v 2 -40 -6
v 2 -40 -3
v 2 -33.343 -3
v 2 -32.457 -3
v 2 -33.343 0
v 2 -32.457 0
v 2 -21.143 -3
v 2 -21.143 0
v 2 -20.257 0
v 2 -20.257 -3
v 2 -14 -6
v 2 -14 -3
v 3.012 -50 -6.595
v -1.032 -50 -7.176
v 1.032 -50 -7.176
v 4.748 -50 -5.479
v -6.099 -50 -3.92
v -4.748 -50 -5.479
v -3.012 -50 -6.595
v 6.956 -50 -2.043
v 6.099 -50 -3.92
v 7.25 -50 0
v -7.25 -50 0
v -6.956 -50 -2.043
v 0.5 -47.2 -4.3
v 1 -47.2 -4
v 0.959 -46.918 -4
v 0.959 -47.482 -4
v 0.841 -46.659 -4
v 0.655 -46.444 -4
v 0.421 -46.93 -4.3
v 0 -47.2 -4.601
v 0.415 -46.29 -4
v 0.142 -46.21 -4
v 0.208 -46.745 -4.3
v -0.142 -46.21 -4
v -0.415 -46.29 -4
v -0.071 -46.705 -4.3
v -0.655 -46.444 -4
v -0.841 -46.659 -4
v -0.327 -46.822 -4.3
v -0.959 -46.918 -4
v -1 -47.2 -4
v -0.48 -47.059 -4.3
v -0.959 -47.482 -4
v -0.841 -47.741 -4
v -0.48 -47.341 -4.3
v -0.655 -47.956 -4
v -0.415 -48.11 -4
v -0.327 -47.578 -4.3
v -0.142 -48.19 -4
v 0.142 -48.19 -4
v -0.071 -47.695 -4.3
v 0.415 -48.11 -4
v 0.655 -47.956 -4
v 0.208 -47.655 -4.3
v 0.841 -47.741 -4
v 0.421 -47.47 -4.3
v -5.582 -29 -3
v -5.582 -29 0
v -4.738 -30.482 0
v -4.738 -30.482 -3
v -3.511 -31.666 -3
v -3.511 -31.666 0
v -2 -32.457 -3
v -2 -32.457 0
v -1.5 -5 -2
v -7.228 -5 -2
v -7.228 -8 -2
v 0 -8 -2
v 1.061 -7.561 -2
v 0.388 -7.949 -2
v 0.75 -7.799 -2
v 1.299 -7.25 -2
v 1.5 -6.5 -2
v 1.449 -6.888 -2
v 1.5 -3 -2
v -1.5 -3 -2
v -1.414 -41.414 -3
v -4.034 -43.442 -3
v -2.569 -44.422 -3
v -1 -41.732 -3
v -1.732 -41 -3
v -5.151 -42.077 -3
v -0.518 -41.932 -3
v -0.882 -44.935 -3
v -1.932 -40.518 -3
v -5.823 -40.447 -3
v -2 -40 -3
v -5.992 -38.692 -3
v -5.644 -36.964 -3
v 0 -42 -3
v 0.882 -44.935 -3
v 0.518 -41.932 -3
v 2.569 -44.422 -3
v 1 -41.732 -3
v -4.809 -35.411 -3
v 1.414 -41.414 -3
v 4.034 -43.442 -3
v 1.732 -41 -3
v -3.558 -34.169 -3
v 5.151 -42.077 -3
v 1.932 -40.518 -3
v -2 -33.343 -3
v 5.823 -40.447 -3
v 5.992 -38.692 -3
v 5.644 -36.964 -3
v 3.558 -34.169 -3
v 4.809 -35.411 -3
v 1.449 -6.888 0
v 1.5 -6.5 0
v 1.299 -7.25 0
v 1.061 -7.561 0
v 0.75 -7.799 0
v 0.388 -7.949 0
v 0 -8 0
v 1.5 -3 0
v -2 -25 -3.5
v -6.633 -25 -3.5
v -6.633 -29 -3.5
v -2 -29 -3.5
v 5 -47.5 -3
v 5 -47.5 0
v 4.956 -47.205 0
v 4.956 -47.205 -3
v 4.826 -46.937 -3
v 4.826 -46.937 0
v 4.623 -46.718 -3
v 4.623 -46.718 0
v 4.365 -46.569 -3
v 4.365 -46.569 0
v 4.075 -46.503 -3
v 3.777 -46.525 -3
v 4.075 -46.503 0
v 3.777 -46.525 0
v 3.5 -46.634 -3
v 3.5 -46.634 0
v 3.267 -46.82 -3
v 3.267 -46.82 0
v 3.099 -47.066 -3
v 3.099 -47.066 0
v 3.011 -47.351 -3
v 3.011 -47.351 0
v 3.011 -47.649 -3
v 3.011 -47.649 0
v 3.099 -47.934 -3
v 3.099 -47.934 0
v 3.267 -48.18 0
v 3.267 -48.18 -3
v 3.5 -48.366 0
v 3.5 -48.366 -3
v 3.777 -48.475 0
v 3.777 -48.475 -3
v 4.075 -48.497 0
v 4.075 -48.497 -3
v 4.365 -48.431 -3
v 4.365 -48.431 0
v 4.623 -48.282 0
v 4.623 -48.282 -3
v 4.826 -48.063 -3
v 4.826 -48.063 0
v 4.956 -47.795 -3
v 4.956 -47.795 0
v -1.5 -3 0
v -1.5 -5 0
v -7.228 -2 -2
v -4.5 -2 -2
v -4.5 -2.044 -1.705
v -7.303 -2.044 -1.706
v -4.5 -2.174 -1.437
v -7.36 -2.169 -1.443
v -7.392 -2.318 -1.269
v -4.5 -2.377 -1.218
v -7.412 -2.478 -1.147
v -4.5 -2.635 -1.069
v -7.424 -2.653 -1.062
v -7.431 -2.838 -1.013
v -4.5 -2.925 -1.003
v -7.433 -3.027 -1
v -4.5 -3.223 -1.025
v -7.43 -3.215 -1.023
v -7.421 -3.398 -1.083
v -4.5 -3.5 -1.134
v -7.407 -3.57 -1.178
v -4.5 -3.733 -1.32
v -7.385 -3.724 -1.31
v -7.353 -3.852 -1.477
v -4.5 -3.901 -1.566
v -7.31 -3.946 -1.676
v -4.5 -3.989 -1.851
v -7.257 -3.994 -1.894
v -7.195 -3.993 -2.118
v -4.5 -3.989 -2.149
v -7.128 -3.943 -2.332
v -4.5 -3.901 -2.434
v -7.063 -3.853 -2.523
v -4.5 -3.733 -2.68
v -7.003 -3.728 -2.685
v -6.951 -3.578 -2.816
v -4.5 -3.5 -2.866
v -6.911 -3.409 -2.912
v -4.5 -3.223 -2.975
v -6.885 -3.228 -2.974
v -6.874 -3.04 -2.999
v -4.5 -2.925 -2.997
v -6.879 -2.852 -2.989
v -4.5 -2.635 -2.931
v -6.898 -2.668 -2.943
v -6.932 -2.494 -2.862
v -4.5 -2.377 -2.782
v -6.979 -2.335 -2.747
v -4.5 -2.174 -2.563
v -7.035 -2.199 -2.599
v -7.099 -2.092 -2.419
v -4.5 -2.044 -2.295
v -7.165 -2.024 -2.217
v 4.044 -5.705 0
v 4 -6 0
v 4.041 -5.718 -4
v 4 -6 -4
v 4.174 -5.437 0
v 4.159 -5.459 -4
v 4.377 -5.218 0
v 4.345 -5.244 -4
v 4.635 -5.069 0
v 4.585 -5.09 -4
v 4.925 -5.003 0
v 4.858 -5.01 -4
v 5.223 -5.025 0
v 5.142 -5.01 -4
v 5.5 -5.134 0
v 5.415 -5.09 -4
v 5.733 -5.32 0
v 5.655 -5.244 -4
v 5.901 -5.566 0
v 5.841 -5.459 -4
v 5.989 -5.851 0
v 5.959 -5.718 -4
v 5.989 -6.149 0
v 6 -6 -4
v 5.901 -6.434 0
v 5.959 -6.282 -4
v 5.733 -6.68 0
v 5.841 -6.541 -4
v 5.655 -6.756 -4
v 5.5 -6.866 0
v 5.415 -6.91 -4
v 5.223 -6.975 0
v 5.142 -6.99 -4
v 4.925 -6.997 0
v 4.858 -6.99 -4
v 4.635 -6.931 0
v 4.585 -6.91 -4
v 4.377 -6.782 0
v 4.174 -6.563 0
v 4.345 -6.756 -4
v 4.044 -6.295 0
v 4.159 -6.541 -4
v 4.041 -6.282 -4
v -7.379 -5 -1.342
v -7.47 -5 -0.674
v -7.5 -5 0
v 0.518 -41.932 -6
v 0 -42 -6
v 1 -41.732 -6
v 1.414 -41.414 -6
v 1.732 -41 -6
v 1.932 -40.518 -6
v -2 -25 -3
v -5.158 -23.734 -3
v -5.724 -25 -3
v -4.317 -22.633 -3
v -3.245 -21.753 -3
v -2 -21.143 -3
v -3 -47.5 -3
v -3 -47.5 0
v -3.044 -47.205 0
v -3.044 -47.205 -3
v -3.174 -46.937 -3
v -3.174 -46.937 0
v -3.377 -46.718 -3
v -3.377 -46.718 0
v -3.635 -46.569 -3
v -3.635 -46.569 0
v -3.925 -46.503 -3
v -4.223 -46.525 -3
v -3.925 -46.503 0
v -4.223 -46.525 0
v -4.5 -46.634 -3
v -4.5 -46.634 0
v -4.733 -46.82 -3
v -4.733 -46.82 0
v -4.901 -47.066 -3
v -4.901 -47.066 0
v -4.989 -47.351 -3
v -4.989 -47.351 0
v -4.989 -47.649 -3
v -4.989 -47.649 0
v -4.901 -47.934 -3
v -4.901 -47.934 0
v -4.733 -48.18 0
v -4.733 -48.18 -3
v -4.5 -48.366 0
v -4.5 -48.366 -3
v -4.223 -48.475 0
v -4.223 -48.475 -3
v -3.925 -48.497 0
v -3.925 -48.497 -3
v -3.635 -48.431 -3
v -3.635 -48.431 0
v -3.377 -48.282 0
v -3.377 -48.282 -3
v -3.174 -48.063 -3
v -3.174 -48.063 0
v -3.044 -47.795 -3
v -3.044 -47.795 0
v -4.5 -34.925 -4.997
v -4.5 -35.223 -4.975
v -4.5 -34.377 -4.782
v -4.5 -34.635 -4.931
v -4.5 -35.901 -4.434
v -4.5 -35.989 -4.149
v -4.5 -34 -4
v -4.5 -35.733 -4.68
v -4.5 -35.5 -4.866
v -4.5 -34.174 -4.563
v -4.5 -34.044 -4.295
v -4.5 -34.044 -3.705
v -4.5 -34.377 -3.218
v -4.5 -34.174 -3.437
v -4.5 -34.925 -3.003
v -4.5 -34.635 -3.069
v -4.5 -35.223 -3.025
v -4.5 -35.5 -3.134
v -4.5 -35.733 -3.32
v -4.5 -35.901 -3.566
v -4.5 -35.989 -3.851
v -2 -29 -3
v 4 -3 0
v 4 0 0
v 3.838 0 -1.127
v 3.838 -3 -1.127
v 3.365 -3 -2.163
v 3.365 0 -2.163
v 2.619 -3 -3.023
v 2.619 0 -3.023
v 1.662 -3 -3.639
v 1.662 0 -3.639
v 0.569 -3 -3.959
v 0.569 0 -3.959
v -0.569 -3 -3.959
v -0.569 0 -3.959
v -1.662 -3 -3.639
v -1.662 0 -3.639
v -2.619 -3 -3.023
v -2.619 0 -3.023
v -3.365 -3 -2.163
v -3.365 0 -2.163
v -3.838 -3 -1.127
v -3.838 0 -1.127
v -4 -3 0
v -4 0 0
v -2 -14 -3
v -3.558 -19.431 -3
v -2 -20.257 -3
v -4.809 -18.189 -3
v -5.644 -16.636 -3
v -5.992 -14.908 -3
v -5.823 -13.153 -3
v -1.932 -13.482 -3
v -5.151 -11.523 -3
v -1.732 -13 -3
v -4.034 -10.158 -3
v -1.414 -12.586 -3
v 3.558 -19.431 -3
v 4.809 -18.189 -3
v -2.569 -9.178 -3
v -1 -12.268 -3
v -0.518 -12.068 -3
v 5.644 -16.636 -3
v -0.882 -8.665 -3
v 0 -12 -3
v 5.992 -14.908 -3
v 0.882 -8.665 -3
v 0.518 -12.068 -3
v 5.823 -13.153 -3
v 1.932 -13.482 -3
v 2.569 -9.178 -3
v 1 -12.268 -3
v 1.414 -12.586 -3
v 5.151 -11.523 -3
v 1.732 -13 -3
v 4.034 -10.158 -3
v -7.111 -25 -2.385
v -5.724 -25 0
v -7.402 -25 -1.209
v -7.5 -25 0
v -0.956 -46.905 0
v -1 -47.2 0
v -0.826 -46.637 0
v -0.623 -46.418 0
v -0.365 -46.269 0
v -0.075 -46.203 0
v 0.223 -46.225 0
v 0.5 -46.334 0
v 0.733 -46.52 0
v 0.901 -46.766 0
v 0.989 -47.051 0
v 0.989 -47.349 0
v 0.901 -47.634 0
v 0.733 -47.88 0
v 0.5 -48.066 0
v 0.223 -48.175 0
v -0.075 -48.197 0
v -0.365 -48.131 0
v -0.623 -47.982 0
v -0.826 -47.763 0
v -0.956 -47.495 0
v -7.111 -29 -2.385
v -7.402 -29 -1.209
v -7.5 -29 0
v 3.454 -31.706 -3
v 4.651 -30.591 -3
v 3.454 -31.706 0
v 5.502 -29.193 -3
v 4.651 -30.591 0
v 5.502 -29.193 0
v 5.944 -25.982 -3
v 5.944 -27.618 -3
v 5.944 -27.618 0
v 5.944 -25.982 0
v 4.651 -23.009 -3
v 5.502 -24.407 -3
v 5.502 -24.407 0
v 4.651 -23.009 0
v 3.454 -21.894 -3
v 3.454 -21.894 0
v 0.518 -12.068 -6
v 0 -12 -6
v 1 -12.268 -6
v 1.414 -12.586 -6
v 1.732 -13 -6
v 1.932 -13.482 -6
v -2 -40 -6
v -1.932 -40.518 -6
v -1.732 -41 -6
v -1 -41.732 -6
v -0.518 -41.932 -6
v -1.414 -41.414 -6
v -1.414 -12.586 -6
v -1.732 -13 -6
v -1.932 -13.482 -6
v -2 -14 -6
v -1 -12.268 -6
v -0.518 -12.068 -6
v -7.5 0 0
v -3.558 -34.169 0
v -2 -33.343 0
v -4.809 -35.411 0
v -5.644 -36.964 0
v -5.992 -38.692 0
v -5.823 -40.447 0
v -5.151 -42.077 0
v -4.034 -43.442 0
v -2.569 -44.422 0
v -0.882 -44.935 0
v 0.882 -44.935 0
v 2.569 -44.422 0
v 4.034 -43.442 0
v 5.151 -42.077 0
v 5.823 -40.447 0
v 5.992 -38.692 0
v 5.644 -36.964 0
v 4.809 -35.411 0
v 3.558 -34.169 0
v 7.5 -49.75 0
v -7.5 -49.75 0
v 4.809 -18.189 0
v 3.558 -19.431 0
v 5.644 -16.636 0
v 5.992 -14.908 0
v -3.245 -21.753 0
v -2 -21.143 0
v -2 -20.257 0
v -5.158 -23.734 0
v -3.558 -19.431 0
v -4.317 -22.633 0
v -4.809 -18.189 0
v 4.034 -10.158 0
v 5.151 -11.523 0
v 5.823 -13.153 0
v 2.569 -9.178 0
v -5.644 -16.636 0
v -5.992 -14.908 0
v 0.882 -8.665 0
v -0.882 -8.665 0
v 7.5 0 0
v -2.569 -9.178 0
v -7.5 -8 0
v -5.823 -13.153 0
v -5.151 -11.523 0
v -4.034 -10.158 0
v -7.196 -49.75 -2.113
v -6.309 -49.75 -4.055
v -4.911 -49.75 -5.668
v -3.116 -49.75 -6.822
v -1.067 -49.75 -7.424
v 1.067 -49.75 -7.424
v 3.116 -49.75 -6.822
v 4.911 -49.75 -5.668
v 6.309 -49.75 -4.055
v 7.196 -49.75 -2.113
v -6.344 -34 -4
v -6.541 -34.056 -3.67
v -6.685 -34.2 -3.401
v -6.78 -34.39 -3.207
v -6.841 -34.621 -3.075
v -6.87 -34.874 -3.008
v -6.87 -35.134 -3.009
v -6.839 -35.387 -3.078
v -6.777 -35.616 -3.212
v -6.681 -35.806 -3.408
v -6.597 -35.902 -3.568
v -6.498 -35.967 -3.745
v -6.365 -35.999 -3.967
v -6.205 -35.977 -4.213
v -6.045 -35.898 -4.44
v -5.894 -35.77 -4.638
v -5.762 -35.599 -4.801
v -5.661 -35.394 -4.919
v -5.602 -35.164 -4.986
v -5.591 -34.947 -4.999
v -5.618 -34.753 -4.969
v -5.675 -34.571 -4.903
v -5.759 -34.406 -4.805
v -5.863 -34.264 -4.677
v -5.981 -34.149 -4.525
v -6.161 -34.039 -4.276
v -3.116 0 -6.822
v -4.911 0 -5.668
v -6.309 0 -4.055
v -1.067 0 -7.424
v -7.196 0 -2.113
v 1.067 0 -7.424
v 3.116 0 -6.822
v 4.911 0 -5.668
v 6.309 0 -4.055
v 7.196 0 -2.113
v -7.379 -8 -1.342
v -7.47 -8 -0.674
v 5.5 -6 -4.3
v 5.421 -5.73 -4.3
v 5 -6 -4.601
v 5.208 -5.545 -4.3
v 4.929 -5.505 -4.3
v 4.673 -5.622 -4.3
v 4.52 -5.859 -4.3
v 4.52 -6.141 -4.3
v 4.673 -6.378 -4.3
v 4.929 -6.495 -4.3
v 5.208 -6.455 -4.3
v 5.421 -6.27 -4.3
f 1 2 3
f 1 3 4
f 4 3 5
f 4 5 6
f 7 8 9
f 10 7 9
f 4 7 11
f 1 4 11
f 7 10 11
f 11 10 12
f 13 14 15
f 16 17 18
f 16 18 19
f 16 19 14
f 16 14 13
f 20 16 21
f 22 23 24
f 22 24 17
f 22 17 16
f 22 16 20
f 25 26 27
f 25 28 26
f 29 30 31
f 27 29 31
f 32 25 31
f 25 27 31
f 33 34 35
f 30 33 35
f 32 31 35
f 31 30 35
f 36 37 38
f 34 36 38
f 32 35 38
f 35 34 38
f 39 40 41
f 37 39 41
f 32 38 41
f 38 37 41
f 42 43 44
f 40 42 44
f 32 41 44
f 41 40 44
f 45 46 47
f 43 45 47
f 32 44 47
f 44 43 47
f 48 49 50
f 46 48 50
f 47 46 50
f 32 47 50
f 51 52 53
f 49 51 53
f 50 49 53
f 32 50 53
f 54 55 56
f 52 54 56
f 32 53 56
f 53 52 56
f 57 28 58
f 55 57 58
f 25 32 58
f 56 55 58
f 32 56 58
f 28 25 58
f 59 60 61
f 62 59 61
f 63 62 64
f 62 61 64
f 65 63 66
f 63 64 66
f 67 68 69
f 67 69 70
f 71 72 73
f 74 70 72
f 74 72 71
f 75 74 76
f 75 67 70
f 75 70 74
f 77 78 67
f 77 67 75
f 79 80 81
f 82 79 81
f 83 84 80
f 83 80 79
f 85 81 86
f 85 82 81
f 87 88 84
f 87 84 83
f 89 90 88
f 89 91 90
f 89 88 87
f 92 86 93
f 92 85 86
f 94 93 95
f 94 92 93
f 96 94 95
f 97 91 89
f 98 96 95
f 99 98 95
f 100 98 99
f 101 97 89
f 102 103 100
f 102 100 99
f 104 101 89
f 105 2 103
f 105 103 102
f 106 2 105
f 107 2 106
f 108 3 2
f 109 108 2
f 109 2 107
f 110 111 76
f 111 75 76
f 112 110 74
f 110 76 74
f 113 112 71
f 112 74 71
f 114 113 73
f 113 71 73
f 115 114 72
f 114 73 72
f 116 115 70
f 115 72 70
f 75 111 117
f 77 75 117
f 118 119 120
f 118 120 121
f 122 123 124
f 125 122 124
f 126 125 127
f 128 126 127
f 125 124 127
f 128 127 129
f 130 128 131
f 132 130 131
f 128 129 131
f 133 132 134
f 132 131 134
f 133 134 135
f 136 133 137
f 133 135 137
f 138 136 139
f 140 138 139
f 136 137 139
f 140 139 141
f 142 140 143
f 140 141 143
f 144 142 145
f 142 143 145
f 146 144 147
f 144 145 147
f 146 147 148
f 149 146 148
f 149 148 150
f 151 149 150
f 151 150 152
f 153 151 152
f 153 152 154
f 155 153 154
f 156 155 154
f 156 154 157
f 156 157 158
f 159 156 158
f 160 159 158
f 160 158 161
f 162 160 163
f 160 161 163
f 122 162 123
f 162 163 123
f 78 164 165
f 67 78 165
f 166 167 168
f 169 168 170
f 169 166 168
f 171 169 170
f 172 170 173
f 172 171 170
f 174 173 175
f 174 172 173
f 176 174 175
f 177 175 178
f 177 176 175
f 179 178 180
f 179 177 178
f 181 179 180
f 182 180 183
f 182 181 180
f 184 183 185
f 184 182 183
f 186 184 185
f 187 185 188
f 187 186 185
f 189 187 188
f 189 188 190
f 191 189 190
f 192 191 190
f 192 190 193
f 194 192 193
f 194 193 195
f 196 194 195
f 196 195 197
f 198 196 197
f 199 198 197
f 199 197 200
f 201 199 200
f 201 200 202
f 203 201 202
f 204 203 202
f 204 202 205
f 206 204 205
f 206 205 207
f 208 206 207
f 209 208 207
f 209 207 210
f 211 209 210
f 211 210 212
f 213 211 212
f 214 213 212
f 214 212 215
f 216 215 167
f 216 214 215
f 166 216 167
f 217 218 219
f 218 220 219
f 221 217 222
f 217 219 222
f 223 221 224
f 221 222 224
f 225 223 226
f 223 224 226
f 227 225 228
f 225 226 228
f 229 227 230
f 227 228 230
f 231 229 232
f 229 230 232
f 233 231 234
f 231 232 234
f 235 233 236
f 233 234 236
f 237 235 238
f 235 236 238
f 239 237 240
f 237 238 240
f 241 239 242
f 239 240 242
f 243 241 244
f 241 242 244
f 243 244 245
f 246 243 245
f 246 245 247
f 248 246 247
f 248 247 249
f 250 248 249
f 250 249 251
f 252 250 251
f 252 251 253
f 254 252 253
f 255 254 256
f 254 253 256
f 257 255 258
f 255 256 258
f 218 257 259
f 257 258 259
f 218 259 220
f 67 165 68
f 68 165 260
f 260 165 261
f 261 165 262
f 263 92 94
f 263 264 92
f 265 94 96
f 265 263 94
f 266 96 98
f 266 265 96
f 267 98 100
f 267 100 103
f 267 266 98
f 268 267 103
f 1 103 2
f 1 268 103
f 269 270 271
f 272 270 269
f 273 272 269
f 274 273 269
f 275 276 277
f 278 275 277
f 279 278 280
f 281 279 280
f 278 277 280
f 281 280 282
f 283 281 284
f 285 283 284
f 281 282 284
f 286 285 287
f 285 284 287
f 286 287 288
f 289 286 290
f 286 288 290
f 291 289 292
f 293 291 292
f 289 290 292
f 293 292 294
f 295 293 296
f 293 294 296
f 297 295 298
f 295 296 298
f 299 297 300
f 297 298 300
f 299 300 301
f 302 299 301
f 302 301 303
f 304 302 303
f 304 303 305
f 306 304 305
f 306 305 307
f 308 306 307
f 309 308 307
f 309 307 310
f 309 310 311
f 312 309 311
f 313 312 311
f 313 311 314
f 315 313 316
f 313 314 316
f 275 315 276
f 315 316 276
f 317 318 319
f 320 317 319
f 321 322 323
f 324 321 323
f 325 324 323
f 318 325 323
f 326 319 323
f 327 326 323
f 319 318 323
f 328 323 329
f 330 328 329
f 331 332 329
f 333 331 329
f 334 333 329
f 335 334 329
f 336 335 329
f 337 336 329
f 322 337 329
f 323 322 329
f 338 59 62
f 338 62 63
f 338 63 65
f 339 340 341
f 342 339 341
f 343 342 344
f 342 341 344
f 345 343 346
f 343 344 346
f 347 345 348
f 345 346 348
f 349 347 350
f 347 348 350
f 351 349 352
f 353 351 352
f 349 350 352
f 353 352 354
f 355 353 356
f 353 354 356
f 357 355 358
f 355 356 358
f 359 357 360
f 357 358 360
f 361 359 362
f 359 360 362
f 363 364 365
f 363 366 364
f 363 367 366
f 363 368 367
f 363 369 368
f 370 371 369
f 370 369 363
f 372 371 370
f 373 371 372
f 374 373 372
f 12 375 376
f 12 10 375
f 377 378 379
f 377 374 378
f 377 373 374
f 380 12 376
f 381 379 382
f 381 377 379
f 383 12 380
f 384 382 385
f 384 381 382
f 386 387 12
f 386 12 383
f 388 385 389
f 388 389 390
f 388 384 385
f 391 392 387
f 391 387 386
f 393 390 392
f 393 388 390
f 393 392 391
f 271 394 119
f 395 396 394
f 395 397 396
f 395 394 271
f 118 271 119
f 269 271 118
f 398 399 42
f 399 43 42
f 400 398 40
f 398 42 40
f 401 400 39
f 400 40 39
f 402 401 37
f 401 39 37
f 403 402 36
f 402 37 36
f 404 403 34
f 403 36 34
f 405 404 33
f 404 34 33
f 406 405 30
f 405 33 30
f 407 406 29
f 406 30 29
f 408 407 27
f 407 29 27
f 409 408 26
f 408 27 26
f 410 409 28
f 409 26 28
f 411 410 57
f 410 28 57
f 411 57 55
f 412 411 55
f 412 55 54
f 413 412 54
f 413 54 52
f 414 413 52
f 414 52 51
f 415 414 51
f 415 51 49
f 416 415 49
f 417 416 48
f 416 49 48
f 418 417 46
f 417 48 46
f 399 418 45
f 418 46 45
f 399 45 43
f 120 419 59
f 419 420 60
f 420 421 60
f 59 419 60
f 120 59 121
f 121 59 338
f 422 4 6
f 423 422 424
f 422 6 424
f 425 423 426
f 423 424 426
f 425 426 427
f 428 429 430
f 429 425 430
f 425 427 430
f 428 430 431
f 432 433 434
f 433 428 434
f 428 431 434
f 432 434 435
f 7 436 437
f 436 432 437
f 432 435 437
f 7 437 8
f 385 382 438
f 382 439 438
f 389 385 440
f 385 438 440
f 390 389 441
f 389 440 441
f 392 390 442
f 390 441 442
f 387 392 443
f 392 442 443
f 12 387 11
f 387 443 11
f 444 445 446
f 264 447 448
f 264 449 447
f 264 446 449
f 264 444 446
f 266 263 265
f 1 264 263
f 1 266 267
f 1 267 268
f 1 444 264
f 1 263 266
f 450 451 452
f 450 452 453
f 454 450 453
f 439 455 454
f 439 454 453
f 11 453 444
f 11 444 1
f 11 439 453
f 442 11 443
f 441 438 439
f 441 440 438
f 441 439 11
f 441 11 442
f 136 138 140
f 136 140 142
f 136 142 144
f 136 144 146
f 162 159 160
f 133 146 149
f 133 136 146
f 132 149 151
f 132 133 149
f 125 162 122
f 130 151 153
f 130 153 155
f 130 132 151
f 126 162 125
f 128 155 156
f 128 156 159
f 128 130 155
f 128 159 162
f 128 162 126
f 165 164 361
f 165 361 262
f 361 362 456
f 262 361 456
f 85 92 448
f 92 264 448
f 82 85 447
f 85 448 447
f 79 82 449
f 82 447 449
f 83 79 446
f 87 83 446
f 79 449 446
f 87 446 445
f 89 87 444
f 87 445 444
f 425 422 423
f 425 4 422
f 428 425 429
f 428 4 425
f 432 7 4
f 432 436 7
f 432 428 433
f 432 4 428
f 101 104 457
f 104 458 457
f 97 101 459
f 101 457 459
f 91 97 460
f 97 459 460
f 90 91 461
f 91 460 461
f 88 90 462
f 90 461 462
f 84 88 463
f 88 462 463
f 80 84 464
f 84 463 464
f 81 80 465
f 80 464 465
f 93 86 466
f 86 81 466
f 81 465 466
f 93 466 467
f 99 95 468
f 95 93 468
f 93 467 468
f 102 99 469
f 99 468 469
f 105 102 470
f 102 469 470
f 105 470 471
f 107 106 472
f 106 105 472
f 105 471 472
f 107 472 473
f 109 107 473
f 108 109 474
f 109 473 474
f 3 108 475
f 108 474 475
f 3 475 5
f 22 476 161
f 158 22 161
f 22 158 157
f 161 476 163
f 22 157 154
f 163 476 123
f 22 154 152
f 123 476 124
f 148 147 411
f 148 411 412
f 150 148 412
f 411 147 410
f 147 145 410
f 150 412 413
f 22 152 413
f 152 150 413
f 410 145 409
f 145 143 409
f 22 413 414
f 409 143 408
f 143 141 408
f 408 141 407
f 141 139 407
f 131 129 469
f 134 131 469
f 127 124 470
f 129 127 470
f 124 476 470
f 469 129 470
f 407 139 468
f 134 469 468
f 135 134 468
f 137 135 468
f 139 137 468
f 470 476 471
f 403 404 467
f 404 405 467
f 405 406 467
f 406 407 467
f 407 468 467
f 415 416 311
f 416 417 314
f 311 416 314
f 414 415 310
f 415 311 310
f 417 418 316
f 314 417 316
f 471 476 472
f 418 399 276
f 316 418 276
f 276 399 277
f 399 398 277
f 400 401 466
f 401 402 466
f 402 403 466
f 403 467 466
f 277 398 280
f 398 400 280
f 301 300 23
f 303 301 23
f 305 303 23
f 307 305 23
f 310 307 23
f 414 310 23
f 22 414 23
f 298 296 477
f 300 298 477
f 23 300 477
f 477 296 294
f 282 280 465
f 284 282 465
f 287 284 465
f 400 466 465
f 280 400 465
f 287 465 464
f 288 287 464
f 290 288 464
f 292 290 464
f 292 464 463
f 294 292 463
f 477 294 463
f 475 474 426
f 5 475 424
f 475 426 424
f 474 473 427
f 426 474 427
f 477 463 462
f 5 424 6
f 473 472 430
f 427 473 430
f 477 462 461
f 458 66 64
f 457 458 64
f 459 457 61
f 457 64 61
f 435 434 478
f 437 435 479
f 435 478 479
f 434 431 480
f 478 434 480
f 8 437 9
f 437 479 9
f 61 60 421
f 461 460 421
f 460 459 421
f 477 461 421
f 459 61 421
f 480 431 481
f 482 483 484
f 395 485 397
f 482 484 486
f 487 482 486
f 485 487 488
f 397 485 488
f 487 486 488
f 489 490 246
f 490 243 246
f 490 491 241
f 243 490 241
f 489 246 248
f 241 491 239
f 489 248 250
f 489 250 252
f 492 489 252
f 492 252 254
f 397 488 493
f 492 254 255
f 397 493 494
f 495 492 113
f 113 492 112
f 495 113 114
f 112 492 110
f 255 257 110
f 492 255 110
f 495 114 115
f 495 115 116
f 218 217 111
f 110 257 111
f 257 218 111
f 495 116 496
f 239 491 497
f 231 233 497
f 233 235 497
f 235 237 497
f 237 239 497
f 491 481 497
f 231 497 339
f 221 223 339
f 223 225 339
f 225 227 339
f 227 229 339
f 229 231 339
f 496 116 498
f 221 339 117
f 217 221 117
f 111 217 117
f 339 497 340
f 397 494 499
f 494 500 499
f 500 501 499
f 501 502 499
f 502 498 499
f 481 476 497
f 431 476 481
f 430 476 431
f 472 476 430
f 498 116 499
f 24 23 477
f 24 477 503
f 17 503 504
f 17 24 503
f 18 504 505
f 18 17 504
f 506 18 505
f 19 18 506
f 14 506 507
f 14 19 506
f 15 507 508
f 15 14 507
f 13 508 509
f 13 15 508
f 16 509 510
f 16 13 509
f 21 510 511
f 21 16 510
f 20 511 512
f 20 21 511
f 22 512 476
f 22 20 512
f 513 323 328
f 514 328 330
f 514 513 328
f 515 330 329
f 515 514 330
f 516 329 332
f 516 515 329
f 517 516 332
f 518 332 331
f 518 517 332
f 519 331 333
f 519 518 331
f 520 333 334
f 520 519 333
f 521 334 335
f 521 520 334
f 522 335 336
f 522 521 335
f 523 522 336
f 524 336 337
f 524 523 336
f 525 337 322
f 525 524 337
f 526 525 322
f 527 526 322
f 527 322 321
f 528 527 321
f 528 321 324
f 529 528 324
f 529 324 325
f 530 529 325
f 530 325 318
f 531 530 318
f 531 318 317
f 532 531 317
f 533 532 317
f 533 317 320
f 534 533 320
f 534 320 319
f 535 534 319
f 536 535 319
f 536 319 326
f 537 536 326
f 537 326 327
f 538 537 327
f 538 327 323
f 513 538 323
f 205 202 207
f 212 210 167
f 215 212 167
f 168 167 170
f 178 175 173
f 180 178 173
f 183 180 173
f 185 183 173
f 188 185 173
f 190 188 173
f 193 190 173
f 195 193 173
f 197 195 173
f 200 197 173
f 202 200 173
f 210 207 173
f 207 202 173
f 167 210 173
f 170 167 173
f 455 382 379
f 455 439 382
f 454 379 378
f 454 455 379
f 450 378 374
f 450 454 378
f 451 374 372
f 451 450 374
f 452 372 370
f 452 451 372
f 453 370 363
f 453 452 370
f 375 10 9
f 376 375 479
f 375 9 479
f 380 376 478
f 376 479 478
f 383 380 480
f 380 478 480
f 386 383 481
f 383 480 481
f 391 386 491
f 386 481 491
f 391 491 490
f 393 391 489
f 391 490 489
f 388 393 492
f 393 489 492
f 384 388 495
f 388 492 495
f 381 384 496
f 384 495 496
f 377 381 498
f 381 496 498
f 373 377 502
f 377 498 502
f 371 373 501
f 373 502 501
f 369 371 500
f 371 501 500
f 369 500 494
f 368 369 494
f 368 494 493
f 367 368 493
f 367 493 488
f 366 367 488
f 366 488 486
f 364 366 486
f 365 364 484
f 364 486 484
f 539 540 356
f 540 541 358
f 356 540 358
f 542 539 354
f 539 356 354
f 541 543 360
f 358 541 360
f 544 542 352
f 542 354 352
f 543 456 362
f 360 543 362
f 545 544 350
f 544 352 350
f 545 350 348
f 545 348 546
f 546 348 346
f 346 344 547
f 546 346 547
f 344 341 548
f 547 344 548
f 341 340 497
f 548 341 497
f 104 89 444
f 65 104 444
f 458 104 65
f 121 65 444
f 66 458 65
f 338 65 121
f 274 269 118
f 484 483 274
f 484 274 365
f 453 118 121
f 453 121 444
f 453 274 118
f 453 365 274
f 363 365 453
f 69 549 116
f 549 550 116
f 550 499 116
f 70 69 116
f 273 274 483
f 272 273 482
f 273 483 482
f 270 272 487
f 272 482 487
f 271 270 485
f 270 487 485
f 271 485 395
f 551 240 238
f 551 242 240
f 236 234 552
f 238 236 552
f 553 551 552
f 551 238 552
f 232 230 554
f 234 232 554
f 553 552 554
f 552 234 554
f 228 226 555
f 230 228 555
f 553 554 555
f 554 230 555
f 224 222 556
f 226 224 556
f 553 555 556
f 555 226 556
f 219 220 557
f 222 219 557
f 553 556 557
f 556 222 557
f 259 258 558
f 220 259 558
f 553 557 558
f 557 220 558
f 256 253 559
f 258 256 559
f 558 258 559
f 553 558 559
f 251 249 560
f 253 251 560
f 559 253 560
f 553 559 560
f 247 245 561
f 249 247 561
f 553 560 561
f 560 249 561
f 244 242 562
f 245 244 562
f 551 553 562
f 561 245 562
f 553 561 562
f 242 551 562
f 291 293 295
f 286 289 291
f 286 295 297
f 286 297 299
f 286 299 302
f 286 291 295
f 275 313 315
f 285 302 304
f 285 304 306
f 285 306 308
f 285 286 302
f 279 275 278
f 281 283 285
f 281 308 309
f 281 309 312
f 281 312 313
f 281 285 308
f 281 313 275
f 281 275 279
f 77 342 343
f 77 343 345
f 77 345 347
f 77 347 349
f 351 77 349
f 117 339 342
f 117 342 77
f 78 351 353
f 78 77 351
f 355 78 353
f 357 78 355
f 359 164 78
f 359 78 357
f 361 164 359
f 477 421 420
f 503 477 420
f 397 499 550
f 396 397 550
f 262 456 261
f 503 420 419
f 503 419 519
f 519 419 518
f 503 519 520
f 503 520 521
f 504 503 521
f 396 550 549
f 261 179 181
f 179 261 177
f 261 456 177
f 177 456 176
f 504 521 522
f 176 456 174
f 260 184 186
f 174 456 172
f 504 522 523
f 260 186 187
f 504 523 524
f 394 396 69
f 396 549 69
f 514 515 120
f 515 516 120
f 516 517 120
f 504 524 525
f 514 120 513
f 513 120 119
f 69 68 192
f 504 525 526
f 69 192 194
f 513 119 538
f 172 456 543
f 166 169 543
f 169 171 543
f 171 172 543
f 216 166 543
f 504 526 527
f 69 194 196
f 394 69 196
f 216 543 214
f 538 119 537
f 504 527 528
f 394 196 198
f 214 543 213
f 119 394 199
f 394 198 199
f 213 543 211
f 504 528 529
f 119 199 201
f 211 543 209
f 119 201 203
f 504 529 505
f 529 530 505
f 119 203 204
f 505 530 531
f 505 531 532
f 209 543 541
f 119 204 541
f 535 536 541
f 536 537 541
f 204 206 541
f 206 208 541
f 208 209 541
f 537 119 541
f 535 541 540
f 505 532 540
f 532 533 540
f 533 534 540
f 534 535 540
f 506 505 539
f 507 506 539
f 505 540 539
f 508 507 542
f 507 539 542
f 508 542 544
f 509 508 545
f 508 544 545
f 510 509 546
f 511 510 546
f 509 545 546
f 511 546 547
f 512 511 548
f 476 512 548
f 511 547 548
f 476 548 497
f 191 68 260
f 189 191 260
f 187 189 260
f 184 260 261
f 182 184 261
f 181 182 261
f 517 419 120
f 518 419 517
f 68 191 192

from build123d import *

# Parameters (mm, degrees)
F1_DEPTH  = 50
F2_R      = 6
F3_DEPTH  = 3
F4_R      = 4
F5_DEPTH  = 3
F6_W      = 4
F6_H      = 30
F7_DEPTH  = 6
F8_R      = 1.99999
F9_W      = 9.3910377485
F9_H      = 4
F10_DEPTH = 3.5
F12_D     = 2
F12_DEPTH = 4
F12_TIP   = 0.600860619
F14_DEPTH = 2
F15_R     = 1.5
F16_SIZE  = 0.25
F18_R     = 1
F19_DEPTH = 3
F20_R     = 1
F21_DEPTH = 3


# Not quite as in the source:
# - a fillet or chamfer is up to 0.001 mm smaller than in the source, because OpenCascade refuses the exact size


with BuildPart() as f1:
    # F0 (on Front) → F1 (new body)
    with BuildSketch(Plane.XZ):
        with BuildLine():
            Line((7.5, 0), (-7.5, 0))
            ThreePointArc((-7.5, 0), (0, -7.5), (7.5, 0))
        make_face()
    extrude(amount=F1_DEPTH)

    # F2 (on face) → F3 (cut)
    with BuildSketch(Plane.XY):
        with Locations((0, -39)):
            Circle(F2_R)
        with Locations((0, -26.8)):
            Circle(F2_R)
        with Locations((0, -14.6)):
            Circle(F2_R)
    extrude(amount=-F3_DEPTH, mode=Mode.SUBTRACT)

    # F4 (on face) → F5 (cut)
    with BuildSketch(Plane(origin=(0, 0, 0), x_dir=(-1, 0, 0), z_dir=(0, 1, 0))):
        Circle(F4_R)
    extrude(amount=-F5_DEPTH, mode=Mode.SUBTRACT)

    # F6 (on face) → F7 (cut)
    with BuildSketch(Plane.XY):
        with Locations((0, -27)):
            Rectangle(F6_W, F6_H)
    extrude(amount=-F7_DEPTH, mode=Mode.SUBTRACT)

    # F8 (radius 2 in the source; OpenCascade refuses exactly that, so slightly less here)
    f8_edges = [f1.edges().sort_by_distance(p)[0] for p in [
        (-2, -12, -4.5),
        (2, -12, -4.5),
        (-2, -42, -4.5),
        (2, -42, -4.5),
    ]]
    fillet(f8_edges, radius=F8_R)

    # F9 (on face) → F10 (cut)
    with BuildSketch(Plane.XY):
        with Locations((-4.6955188743, -27)):
            Rectangle(F9_W, F9_H)
    extrude(amount=-F10_DEPTH, mode=Mode.SUBTRACT)

    # F12
    with Locations(Plane.XY):
        with Locations((5, -6), (0, -47.2)):
            Hole(F12_D / 2, depth=F12_DEPTH)
            with Locations((0, 0, -(F12_DEPTH + F12_TIP / 2))):  # 118° drill point
                Cone(0, F12_D / 2, F12_TIP, mode=Mode.SUBTRACT)

    # F13 (on face) → F14 (cut)
    with BuildSketch(Plane.XY):
        Polygon((1.5, -3), (-1.5, -3), (-1.5, -5), (-8.88405554, -5), (-8.88405554, -8), (-1.5, -8), (1.5, -8), align=None)
    extrude(amount=-F14_DEPTH, mode=Mode.SUBTRACT)

    # F15
    f15_edges = [f1.edges().sort_by_distance(p)[0] for p in [
        (1.5, -8, -1),
    ]]
    fillet(f15_edges, radius=F15_R)

    # F16
    f16_edges = [f1.edges().sort_by_distance(p)[0] for p in [
        (0, -50, -7.5),
    ]]
    chamfer(f16_edges, length=F16_SIZE)

    # F18 (on offset) → F19 (cut)
    with BuildSketch(Plane.YZ.offset(-7.5)):
        with Locations((-3, -2)):
            Circle(F18_R)
        with Locations((-35, -4)):
            Circle(F18_R)
    extrude(amount=F19_DEPTH, mode=Mode.SUBTRACT)

    # F20 (on face) → F21 (cut)
    with BuildSketch(Plane.XY):
        with Locations((-4, -47.5)):
            Circle(F20_R)
        with Locations((4, -47.5)):
            Circle(F20_R)
    extrude(amount=-F21_DEPTH, mode=Mode.SUBTRACT)


solid = f1.part
